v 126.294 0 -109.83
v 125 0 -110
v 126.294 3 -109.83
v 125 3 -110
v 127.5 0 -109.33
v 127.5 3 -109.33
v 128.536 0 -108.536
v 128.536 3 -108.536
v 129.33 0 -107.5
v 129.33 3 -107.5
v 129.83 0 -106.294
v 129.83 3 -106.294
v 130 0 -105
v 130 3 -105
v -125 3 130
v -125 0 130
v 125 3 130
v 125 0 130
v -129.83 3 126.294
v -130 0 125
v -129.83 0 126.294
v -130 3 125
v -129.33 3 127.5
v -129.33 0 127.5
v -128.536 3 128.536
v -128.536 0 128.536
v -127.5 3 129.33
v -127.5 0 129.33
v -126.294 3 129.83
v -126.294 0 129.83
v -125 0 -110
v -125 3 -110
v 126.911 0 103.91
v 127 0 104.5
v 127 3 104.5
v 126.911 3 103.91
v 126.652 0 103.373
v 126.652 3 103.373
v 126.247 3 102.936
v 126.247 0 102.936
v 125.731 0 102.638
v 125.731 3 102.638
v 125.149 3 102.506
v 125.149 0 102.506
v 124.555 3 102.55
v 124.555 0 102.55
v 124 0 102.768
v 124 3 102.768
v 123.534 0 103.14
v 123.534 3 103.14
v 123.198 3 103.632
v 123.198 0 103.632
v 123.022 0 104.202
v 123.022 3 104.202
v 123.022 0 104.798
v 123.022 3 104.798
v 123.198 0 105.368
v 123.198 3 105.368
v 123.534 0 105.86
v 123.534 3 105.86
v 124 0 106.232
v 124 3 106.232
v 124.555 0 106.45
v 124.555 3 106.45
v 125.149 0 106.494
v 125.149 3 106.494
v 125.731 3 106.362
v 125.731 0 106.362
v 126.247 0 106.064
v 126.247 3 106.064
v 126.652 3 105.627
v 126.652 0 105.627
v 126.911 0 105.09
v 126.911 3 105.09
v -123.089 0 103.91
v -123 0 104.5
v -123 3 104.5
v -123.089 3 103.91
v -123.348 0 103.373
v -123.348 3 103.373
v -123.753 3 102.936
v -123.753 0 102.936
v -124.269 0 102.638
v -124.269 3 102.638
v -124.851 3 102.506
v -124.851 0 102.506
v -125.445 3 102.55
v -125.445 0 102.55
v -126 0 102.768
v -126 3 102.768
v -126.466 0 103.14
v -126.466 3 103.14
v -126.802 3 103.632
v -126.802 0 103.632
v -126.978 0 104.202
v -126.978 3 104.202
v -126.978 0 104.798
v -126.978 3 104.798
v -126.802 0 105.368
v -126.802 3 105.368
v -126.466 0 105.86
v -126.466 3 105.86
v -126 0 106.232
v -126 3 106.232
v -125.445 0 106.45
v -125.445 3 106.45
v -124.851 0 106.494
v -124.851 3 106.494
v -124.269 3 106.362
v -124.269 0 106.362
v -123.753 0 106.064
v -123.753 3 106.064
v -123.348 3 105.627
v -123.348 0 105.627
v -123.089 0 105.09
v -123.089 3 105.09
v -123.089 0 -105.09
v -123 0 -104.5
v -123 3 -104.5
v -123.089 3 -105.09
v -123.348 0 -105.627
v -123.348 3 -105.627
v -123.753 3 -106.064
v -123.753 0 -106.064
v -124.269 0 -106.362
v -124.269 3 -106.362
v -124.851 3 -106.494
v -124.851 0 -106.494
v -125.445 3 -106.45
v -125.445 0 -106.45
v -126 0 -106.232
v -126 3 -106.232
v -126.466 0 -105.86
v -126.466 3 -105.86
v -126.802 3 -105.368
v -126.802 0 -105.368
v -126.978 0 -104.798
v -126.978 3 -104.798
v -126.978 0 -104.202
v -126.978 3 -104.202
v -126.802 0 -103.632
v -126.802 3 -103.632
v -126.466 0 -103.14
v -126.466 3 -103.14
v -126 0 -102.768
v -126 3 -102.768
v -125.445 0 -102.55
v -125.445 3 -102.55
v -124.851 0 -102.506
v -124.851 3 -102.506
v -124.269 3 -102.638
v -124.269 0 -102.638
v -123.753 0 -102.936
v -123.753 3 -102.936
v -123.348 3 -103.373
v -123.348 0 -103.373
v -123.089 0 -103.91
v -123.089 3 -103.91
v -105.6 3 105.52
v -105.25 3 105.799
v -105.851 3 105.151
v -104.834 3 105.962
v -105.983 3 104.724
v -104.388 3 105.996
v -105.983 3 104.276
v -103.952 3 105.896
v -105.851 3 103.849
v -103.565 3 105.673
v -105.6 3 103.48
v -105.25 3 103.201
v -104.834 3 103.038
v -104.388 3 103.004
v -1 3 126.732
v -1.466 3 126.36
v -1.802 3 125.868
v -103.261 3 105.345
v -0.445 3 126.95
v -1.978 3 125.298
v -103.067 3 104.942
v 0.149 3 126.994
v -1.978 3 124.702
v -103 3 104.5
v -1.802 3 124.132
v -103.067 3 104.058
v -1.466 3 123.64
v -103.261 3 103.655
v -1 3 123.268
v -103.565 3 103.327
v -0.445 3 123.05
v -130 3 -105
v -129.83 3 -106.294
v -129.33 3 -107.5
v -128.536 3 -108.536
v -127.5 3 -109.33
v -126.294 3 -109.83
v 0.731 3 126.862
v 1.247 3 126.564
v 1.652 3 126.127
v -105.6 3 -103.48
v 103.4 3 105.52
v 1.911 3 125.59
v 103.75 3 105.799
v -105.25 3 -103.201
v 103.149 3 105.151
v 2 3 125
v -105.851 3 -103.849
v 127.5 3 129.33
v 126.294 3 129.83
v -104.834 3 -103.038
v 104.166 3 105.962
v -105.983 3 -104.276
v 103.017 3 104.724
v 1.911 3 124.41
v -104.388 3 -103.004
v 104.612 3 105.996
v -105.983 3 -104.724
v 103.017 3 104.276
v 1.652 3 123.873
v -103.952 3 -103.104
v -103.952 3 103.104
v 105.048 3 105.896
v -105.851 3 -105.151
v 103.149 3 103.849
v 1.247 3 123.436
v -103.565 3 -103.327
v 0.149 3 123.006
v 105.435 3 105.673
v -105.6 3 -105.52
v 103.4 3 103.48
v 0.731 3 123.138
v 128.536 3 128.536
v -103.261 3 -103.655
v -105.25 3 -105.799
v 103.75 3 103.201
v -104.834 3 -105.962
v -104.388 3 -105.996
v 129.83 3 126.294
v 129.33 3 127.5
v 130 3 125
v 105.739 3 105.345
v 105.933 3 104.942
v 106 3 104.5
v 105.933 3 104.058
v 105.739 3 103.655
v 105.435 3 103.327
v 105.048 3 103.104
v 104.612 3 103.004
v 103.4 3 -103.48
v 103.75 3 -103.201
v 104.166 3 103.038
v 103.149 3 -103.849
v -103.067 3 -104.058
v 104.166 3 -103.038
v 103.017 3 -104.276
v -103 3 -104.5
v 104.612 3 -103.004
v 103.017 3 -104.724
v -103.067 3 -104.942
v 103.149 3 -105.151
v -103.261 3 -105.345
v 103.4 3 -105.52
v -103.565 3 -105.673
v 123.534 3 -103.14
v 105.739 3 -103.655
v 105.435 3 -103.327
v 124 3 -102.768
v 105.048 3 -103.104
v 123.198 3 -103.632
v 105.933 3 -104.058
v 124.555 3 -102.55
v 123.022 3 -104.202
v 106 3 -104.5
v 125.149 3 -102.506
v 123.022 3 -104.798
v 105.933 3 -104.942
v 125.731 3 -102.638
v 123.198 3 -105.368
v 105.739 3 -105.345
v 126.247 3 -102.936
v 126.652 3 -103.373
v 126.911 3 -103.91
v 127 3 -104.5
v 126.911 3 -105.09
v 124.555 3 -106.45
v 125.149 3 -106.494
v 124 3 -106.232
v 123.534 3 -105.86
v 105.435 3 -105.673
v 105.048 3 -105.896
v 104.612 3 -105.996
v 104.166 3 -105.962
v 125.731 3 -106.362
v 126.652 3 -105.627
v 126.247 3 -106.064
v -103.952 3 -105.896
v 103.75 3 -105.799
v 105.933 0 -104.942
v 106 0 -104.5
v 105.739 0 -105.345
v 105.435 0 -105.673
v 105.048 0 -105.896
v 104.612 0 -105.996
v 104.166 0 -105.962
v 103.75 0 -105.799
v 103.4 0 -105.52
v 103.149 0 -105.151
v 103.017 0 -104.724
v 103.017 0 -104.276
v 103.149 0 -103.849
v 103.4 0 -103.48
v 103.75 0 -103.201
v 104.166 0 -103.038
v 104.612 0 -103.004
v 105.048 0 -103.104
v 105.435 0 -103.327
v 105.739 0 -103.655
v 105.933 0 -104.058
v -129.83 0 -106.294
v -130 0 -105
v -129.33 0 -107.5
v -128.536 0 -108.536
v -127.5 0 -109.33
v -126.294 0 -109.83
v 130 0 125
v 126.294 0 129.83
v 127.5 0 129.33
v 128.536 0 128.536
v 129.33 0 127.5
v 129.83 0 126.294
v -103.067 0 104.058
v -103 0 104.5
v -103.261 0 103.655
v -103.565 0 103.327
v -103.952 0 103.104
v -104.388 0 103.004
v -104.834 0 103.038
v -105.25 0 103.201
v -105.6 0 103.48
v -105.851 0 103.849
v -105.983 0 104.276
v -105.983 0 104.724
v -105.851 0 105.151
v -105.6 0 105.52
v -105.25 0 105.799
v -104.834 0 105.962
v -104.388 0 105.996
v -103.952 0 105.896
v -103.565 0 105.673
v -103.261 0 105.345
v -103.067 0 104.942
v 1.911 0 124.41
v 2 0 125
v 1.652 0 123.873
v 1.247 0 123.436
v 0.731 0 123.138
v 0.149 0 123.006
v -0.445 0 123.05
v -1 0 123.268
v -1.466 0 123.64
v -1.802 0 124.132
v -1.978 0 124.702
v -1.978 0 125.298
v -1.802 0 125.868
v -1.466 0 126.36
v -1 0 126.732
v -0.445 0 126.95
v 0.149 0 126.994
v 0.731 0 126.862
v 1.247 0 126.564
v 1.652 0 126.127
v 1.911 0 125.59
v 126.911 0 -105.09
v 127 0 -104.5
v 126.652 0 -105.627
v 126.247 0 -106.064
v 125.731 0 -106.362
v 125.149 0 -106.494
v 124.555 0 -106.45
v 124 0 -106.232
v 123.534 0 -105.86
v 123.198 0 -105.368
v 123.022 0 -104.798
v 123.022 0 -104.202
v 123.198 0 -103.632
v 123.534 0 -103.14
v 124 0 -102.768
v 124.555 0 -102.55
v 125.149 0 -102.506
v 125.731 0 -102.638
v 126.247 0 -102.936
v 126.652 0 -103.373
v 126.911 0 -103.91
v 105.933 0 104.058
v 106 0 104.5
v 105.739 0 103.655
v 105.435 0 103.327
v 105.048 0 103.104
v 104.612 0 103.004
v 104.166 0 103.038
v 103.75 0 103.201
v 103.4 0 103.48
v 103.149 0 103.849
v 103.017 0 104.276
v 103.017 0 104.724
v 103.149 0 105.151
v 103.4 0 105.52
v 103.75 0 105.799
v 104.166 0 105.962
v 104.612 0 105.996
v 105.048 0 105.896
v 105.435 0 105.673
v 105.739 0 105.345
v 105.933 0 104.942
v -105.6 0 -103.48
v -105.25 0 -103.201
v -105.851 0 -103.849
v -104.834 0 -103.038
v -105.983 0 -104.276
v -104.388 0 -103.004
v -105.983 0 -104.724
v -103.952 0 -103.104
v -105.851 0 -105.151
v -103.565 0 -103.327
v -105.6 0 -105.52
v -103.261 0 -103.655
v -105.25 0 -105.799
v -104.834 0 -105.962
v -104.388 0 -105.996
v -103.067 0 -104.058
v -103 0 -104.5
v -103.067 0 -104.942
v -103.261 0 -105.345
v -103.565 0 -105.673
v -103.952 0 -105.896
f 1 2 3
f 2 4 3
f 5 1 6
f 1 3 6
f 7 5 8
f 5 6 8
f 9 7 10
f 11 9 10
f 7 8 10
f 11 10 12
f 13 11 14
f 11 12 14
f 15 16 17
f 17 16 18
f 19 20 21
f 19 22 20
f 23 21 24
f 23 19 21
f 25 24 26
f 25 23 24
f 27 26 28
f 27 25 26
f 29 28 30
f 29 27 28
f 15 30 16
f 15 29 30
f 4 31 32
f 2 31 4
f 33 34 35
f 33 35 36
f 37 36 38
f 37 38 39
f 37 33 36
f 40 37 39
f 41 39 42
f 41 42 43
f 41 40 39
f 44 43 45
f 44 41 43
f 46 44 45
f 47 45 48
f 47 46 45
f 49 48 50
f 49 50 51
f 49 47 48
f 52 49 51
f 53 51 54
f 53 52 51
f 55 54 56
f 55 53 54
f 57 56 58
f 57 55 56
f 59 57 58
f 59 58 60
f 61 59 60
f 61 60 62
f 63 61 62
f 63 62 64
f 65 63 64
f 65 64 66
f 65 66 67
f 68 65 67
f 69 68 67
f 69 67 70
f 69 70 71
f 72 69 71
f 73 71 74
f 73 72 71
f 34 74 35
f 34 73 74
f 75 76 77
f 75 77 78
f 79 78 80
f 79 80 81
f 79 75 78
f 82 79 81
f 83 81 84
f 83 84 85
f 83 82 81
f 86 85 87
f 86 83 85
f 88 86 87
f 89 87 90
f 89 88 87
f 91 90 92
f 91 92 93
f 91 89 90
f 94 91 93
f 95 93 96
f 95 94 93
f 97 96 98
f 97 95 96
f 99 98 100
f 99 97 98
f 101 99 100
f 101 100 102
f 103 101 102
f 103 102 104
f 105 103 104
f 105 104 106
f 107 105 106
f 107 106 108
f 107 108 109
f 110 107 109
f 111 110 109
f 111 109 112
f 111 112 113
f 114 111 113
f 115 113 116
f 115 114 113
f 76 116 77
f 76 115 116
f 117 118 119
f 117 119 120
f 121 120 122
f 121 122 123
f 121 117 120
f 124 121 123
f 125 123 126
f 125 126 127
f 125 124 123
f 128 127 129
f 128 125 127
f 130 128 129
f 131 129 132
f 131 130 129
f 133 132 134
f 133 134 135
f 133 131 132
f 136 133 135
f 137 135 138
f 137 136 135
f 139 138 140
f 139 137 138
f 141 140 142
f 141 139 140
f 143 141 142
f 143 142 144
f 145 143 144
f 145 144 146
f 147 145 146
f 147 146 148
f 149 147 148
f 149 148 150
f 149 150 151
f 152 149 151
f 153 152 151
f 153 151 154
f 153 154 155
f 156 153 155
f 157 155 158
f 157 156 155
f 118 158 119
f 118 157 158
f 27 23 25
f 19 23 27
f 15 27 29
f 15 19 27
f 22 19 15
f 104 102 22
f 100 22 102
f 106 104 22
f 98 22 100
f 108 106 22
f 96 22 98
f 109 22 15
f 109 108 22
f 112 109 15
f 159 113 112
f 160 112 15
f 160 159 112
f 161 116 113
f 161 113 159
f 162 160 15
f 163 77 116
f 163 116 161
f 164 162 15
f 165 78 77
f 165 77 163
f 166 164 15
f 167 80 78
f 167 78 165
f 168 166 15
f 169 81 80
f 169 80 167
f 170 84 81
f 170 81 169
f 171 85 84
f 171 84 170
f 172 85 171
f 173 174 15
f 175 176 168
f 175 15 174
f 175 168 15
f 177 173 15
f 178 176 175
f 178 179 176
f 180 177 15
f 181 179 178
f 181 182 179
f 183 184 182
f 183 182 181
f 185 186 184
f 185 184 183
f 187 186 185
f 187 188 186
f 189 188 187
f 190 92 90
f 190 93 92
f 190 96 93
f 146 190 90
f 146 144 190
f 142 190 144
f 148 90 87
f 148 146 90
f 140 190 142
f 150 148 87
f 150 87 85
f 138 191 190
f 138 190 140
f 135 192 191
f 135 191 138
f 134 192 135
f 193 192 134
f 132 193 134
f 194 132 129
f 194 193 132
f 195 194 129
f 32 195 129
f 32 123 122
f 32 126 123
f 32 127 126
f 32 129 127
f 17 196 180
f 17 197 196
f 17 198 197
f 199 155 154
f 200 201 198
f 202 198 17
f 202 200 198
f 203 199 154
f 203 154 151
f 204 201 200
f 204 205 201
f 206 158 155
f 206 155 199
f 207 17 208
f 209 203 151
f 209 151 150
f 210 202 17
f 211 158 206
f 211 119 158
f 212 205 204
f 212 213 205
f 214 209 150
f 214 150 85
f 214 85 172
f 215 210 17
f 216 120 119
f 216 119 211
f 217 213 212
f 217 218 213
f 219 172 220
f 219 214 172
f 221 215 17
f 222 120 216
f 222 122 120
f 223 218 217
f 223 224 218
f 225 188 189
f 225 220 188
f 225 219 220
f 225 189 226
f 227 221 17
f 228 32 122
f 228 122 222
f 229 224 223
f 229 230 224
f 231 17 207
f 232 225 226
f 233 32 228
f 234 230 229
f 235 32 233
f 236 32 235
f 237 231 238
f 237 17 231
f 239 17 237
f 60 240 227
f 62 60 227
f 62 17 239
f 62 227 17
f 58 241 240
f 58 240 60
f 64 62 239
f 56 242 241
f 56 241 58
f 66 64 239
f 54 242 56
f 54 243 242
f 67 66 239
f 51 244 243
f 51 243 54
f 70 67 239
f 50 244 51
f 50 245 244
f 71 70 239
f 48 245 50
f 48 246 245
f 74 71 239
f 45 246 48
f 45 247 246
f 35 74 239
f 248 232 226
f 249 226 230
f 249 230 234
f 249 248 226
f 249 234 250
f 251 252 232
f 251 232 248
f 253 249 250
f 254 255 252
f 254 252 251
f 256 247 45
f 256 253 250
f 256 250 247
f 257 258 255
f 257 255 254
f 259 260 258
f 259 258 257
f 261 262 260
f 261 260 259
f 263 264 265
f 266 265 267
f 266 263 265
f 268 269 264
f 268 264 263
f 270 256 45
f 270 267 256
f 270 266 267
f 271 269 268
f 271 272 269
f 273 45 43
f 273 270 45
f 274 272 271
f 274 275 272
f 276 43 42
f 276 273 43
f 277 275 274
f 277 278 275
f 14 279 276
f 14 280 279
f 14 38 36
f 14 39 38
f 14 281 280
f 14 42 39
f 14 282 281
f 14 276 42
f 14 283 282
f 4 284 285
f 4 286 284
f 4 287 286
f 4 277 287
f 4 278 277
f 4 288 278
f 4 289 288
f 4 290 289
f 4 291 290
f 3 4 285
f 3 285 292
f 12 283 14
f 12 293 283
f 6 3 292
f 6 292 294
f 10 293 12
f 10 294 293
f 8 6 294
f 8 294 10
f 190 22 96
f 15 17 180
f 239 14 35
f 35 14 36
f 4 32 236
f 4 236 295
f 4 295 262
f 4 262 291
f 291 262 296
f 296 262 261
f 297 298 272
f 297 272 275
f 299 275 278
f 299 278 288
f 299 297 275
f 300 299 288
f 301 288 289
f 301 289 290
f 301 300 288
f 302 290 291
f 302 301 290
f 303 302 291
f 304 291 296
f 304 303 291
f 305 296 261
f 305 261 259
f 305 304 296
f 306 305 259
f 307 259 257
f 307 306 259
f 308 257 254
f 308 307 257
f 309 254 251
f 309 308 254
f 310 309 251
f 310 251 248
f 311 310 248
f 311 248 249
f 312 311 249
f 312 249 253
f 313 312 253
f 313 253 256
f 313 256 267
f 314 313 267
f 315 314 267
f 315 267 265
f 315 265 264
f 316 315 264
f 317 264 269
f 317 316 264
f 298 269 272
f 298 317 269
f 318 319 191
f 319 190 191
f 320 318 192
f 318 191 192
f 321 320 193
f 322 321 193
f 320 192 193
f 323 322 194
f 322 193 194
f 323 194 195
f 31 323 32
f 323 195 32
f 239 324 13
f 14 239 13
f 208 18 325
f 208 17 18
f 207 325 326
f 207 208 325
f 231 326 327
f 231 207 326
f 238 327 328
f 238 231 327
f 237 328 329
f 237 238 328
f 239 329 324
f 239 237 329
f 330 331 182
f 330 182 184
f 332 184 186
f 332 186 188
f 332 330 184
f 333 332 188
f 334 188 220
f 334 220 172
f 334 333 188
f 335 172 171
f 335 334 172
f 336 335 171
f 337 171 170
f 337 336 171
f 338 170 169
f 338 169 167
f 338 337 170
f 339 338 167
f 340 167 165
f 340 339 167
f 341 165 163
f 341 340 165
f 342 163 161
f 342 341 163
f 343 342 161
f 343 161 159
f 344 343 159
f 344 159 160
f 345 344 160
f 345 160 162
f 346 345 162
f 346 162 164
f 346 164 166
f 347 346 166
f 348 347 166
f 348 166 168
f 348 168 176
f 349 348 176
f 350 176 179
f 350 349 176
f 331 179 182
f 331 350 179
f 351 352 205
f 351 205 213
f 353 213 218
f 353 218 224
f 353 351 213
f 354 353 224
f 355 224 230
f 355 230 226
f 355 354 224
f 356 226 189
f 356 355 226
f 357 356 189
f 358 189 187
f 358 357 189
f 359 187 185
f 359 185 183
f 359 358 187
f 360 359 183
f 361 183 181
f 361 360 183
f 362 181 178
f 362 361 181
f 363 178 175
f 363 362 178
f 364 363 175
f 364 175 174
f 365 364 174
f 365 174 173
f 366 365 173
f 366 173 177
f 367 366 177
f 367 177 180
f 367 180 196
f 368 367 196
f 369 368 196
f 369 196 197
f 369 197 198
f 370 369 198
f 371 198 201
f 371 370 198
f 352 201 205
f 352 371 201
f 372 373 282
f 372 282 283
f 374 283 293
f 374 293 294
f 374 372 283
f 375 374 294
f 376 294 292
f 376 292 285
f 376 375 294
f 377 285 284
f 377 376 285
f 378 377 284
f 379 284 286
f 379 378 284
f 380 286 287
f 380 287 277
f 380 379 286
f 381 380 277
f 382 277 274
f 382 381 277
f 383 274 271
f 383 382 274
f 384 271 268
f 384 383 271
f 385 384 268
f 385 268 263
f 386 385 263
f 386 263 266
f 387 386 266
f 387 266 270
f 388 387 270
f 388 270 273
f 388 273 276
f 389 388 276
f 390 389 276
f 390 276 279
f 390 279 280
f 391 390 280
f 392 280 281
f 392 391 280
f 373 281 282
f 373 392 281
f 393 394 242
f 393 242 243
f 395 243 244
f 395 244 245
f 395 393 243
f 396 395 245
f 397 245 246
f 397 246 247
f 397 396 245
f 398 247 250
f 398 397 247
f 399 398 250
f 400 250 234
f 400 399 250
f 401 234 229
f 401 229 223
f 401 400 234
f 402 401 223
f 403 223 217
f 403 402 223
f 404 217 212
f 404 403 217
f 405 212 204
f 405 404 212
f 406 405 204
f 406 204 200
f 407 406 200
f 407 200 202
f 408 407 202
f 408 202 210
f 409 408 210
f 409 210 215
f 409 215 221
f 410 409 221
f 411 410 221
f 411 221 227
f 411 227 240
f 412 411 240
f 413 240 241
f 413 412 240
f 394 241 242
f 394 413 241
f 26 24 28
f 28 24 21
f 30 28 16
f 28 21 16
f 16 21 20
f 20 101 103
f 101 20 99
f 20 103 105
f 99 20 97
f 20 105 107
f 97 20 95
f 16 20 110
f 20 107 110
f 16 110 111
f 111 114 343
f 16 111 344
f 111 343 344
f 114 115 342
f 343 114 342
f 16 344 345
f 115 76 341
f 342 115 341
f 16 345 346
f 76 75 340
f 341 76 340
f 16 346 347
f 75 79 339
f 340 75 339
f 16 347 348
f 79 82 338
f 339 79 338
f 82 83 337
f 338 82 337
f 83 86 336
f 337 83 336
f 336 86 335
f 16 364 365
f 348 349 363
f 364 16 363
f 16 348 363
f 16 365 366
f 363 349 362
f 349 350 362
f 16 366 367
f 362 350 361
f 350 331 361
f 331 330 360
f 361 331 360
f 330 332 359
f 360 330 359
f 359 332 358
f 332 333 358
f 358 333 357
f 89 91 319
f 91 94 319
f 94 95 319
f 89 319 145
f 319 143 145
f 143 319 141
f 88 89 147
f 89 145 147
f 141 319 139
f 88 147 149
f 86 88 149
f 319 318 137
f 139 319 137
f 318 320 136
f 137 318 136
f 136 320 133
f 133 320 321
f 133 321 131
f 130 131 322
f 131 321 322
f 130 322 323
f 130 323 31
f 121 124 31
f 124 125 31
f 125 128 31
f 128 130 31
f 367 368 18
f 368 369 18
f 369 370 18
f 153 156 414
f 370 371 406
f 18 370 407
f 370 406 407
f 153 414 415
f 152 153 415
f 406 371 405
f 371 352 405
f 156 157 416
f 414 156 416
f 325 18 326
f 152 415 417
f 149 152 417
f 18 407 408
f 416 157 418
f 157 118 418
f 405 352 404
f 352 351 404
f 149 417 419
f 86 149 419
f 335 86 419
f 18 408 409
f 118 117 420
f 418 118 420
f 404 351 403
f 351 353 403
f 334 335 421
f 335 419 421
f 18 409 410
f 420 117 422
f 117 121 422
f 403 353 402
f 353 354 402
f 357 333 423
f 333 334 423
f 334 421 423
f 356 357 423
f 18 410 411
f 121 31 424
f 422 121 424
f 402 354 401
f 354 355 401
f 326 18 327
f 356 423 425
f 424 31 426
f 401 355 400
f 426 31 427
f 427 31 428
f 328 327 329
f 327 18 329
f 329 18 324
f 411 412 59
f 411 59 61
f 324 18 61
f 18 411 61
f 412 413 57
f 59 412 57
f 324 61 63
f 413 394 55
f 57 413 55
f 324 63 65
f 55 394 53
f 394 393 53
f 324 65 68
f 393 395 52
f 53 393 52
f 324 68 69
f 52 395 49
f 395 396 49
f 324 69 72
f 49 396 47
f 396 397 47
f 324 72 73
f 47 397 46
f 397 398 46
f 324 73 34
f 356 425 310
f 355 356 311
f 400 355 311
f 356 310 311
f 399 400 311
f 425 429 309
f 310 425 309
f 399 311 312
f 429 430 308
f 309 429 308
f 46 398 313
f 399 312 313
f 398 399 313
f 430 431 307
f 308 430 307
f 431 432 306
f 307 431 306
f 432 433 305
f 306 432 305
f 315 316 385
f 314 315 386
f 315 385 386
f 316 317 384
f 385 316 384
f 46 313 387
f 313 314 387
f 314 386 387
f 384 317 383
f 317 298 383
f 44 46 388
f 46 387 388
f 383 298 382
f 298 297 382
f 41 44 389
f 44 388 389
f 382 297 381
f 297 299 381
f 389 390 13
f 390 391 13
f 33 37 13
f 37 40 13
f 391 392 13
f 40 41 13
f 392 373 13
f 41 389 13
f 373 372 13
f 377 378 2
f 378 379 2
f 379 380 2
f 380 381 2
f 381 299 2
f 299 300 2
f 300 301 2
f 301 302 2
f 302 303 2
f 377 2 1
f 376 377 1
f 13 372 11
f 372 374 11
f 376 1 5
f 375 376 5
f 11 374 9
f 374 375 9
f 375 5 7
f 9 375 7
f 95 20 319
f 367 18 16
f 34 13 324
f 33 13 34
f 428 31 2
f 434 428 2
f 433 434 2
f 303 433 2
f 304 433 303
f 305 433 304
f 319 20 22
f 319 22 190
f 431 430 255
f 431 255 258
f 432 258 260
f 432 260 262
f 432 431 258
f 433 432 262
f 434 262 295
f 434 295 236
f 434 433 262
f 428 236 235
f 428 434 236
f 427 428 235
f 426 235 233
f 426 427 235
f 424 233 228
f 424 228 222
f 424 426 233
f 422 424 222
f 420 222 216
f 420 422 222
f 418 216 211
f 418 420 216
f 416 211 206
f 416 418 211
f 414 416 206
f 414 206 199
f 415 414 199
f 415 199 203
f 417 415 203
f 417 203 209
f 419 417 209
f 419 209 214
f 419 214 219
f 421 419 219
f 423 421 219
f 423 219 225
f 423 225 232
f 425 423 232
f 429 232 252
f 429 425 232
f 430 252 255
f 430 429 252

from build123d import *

# Parameters (mm, degrees)
CROQUIS1_W              = 260
CROQUIS1_H              = 240
CROQUIS1_R              = 1.5
CROQUIS1_R_2            = 2
SALIENTE_EXTRUIR1_DEPTH = 3
REDONDEO1_R             = 5


with BuildPart() as part:
    # Croquis1 → Saliente-Extruir1 (new body)
    with BuildSketch(Plane(origin=(0, 0, 0), x_dir=(1, 0, 0), z_dir=(0, 1, 0))):
        with Locations((0, -10)):
            Rectangle(CROQUIS1_W, CROQUIS1_H)
        with Locations((-104.5, 104.5)):
            Circle(CROQUIS1_R, mode=Mode.SUBTRACT)
        with Locations((104.5, 104.5)):
            Circle(CROQUIS1_R, mode=Mode.SUBTRACT)
        with Locations((-104.5, -104.5)):
            Circle(CROQUIS1_R, mode=Mode.SUBTRACT)
        with Locations((104.5, -104.5)):
            Circle(CROQUIS1_R, mode=Mode.SUBTRACT)
        with Locations((125, 104.5)):
            Circle(CROQUIS1_R_2, mode=Mode.SUBTRACT)
        with Locations((125, -104.5)):
            Circle(CROQUIS1_R_2, mode=Mode.SUBTRACT)
        with Locations((-125, -104.5)):
            Circle(CROQUIS1_R_2, mode=Mode.SUBTRACT)
        with Locations((-125, 104.5)):
            Circle(CROQUIS1_R_2, mode=Mode.SUBTRACT)
        with Locations((0, -125)):
            Circle(CROQUIS1_R_2, mode=Mode.SUBTRACT)
    extrude(amount=SALIENTE_EXTRUIR1_DEPTH)

    # Redondeo1
    redondeo1_edges = [part.edges().sort_by_distance(p)[0] for p in [
        (-130, 1.5, -110),
        (130, 1.5, -110),
        (130, 1.5, 130),
        (-130, 1.5, 130),
    ]]
    fillet(redondeo1_edges, radius=REDONDEO1_R)


solid = part.part
